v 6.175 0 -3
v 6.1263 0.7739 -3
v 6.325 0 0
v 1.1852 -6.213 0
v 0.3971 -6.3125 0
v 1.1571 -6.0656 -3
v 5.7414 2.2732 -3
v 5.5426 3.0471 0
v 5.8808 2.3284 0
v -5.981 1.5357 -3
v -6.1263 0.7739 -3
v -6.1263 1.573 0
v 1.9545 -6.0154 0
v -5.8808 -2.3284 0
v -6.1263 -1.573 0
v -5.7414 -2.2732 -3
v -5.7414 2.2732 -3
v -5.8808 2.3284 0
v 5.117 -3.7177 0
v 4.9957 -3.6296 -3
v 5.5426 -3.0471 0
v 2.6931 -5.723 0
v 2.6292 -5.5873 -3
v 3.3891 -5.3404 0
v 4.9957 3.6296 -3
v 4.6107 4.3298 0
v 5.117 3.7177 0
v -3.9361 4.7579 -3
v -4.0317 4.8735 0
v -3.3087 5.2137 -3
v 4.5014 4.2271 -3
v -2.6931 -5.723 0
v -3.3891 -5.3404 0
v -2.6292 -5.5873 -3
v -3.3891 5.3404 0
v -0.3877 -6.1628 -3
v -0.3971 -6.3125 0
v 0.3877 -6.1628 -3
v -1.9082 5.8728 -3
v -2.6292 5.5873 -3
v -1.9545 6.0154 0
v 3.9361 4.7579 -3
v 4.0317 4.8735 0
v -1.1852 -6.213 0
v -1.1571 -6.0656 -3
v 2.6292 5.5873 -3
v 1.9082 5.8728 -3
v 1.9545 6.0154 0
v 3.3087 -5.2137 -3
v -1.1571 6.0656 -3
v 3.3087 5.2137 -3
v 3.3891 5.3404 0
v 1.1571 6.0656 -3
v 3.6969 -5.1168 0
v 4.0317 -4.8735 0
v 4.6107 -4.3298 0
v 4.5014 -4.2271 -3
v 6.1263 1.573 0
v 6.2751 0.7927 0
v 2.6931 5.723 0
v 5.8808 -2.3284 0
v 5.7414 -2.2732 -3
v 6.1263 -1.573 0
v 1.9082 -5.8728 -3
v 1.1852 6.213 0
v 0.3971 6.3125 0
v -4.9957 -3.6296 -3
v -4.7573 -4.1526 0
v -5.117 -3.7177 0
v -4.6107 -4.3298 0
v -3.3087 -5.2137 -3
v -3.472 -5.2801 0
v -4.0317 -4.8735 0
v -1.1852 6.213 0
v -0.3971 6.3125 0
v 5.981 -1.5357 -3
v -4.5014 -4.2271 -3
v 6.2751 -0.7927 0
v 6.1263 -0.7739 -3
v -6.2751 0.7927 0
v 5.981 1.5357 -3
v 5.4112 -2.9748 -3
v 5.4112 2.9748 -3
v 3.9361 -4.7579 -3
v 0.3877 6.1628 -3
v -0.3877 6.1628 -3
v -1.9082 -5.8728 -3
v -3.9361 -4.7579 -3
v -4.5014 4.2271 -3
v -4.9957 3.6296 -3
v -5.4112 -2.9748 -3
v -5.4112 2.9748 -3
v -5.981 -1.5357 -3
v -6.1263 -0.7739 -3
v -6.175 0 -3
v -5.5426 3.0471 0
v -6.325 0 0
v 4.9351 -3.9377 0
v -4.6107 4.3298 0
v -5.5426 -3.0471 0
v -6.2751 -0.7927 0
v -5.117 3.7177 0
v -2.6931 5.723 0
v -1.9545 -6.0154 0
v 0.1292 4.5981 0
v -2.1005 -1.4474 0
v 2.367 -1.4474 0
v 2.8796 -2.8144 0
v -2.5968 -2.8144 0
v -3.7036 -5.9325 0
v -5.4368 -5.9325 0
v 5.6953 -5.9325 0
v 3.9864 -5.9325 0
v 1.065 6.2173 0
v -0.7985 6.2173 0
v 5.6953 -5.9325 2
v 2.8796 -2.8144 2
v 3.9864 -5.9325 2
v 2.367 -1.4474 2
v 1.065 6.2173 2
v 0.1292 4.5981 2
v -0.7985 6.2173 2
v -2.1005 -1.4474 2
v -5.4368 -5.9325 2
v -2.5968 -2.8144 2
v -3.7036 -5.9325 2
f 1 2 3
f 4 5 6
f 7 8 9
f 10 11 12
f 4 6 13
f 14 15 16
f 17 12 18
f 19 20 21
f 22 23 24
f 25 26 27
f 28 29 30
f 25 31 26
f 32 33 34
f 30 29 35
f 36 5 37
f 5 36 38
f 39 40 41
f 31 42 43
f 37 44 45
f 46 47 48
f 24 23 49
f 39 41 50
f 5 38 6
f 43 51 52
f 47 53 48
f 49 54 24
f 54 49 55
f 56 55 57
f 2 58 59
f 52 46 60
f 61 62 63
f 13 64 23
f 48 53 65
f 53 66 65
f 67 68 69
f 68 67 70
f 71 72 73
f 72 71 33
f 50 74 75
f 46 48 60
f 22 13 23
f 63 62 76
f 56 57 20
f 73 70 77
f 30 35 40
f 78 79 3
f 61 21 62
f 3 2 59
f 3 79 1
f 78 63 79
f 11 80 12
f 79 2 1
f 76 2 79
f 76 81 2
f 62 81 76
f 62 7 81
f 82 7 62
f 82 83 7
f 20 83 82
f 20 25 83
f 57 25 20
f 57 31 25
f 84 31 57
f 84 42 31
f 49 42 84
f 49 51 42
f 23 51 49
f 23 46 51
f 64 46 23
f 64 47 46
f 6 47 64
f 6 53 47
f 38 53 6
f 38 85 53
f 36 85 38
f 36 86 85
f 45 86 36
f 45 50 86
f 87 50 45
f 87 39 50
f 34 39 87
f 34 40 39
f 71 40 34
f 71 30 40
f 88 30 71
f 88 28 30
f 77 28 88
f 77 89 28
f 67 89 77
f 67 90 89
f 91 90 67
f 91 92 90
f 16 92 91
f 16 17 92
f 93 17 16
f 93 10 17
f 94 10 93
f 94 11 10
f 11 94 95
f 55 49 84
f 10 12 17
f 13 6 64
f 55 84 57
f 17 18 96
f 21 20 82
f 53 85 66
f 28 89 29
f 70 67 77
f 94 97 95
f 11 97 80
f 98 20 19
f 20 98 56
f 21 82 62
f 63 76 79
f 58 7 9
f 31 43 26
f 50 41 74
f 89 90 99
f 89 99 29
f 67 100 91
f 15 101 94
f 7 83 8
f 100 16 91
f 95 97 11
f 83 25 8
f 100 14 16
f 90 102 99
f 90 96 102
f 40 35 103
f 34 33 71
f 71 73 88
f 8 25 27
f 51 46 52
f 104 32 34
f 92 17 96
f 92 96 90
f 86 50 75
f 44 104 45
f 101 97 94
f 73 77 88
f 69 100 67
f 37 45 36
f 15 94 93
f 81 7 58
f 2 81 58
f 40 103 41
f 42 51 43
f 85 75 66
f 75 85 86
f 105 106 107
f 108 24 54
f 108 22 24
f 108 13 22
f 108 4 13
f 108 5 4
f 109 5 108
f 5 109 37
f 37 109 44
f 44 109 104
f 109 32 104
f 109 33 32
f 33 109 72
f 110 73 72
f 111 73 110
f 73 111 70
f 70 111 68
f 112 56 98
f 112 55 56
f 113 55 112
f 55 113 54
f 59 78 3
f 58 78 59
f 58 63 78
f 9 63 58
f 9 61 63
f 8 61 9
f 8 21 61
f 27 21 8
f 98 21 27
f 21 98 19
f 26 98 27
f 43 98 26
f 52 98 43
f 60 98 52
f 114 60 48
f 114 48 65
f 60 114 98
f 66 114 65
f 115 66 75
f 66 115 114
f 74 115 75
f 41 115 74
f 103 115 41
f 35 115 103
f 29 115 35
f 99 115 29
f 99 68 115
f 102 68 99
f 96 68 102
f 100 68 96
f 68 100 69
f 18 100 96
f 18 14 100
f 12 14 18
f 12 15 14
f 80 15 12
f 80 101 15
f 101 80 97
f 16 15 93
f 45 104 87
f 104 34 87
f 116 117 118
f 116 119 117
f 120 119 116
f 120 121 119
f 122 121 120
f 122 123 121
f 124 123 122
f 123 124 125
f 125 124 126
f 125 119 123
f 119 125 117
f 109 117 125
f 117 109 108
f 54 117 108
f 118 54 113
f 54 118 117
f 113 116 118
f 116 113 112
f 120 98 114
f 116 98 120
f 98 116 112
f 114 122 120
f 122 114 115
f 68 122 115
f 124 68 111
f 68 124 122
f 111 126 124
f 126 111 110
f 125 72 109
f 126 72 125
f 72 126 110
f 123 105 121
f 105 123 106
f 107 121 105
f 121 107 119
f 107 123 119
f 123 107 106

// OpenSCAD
$fn = 50;


difference() {
	union() {
		translate(v = [0, 0, -3.0000000000]) {
			cylinder(h = 3, r1 = 6.1750000000, r2 = 6.3250000000);
		}
		linear_extrude(height = 2) {
			text(font = "Impact", halign = "center", size = 12, text = "A", valign = "center");
		}
	}
	union();
}
